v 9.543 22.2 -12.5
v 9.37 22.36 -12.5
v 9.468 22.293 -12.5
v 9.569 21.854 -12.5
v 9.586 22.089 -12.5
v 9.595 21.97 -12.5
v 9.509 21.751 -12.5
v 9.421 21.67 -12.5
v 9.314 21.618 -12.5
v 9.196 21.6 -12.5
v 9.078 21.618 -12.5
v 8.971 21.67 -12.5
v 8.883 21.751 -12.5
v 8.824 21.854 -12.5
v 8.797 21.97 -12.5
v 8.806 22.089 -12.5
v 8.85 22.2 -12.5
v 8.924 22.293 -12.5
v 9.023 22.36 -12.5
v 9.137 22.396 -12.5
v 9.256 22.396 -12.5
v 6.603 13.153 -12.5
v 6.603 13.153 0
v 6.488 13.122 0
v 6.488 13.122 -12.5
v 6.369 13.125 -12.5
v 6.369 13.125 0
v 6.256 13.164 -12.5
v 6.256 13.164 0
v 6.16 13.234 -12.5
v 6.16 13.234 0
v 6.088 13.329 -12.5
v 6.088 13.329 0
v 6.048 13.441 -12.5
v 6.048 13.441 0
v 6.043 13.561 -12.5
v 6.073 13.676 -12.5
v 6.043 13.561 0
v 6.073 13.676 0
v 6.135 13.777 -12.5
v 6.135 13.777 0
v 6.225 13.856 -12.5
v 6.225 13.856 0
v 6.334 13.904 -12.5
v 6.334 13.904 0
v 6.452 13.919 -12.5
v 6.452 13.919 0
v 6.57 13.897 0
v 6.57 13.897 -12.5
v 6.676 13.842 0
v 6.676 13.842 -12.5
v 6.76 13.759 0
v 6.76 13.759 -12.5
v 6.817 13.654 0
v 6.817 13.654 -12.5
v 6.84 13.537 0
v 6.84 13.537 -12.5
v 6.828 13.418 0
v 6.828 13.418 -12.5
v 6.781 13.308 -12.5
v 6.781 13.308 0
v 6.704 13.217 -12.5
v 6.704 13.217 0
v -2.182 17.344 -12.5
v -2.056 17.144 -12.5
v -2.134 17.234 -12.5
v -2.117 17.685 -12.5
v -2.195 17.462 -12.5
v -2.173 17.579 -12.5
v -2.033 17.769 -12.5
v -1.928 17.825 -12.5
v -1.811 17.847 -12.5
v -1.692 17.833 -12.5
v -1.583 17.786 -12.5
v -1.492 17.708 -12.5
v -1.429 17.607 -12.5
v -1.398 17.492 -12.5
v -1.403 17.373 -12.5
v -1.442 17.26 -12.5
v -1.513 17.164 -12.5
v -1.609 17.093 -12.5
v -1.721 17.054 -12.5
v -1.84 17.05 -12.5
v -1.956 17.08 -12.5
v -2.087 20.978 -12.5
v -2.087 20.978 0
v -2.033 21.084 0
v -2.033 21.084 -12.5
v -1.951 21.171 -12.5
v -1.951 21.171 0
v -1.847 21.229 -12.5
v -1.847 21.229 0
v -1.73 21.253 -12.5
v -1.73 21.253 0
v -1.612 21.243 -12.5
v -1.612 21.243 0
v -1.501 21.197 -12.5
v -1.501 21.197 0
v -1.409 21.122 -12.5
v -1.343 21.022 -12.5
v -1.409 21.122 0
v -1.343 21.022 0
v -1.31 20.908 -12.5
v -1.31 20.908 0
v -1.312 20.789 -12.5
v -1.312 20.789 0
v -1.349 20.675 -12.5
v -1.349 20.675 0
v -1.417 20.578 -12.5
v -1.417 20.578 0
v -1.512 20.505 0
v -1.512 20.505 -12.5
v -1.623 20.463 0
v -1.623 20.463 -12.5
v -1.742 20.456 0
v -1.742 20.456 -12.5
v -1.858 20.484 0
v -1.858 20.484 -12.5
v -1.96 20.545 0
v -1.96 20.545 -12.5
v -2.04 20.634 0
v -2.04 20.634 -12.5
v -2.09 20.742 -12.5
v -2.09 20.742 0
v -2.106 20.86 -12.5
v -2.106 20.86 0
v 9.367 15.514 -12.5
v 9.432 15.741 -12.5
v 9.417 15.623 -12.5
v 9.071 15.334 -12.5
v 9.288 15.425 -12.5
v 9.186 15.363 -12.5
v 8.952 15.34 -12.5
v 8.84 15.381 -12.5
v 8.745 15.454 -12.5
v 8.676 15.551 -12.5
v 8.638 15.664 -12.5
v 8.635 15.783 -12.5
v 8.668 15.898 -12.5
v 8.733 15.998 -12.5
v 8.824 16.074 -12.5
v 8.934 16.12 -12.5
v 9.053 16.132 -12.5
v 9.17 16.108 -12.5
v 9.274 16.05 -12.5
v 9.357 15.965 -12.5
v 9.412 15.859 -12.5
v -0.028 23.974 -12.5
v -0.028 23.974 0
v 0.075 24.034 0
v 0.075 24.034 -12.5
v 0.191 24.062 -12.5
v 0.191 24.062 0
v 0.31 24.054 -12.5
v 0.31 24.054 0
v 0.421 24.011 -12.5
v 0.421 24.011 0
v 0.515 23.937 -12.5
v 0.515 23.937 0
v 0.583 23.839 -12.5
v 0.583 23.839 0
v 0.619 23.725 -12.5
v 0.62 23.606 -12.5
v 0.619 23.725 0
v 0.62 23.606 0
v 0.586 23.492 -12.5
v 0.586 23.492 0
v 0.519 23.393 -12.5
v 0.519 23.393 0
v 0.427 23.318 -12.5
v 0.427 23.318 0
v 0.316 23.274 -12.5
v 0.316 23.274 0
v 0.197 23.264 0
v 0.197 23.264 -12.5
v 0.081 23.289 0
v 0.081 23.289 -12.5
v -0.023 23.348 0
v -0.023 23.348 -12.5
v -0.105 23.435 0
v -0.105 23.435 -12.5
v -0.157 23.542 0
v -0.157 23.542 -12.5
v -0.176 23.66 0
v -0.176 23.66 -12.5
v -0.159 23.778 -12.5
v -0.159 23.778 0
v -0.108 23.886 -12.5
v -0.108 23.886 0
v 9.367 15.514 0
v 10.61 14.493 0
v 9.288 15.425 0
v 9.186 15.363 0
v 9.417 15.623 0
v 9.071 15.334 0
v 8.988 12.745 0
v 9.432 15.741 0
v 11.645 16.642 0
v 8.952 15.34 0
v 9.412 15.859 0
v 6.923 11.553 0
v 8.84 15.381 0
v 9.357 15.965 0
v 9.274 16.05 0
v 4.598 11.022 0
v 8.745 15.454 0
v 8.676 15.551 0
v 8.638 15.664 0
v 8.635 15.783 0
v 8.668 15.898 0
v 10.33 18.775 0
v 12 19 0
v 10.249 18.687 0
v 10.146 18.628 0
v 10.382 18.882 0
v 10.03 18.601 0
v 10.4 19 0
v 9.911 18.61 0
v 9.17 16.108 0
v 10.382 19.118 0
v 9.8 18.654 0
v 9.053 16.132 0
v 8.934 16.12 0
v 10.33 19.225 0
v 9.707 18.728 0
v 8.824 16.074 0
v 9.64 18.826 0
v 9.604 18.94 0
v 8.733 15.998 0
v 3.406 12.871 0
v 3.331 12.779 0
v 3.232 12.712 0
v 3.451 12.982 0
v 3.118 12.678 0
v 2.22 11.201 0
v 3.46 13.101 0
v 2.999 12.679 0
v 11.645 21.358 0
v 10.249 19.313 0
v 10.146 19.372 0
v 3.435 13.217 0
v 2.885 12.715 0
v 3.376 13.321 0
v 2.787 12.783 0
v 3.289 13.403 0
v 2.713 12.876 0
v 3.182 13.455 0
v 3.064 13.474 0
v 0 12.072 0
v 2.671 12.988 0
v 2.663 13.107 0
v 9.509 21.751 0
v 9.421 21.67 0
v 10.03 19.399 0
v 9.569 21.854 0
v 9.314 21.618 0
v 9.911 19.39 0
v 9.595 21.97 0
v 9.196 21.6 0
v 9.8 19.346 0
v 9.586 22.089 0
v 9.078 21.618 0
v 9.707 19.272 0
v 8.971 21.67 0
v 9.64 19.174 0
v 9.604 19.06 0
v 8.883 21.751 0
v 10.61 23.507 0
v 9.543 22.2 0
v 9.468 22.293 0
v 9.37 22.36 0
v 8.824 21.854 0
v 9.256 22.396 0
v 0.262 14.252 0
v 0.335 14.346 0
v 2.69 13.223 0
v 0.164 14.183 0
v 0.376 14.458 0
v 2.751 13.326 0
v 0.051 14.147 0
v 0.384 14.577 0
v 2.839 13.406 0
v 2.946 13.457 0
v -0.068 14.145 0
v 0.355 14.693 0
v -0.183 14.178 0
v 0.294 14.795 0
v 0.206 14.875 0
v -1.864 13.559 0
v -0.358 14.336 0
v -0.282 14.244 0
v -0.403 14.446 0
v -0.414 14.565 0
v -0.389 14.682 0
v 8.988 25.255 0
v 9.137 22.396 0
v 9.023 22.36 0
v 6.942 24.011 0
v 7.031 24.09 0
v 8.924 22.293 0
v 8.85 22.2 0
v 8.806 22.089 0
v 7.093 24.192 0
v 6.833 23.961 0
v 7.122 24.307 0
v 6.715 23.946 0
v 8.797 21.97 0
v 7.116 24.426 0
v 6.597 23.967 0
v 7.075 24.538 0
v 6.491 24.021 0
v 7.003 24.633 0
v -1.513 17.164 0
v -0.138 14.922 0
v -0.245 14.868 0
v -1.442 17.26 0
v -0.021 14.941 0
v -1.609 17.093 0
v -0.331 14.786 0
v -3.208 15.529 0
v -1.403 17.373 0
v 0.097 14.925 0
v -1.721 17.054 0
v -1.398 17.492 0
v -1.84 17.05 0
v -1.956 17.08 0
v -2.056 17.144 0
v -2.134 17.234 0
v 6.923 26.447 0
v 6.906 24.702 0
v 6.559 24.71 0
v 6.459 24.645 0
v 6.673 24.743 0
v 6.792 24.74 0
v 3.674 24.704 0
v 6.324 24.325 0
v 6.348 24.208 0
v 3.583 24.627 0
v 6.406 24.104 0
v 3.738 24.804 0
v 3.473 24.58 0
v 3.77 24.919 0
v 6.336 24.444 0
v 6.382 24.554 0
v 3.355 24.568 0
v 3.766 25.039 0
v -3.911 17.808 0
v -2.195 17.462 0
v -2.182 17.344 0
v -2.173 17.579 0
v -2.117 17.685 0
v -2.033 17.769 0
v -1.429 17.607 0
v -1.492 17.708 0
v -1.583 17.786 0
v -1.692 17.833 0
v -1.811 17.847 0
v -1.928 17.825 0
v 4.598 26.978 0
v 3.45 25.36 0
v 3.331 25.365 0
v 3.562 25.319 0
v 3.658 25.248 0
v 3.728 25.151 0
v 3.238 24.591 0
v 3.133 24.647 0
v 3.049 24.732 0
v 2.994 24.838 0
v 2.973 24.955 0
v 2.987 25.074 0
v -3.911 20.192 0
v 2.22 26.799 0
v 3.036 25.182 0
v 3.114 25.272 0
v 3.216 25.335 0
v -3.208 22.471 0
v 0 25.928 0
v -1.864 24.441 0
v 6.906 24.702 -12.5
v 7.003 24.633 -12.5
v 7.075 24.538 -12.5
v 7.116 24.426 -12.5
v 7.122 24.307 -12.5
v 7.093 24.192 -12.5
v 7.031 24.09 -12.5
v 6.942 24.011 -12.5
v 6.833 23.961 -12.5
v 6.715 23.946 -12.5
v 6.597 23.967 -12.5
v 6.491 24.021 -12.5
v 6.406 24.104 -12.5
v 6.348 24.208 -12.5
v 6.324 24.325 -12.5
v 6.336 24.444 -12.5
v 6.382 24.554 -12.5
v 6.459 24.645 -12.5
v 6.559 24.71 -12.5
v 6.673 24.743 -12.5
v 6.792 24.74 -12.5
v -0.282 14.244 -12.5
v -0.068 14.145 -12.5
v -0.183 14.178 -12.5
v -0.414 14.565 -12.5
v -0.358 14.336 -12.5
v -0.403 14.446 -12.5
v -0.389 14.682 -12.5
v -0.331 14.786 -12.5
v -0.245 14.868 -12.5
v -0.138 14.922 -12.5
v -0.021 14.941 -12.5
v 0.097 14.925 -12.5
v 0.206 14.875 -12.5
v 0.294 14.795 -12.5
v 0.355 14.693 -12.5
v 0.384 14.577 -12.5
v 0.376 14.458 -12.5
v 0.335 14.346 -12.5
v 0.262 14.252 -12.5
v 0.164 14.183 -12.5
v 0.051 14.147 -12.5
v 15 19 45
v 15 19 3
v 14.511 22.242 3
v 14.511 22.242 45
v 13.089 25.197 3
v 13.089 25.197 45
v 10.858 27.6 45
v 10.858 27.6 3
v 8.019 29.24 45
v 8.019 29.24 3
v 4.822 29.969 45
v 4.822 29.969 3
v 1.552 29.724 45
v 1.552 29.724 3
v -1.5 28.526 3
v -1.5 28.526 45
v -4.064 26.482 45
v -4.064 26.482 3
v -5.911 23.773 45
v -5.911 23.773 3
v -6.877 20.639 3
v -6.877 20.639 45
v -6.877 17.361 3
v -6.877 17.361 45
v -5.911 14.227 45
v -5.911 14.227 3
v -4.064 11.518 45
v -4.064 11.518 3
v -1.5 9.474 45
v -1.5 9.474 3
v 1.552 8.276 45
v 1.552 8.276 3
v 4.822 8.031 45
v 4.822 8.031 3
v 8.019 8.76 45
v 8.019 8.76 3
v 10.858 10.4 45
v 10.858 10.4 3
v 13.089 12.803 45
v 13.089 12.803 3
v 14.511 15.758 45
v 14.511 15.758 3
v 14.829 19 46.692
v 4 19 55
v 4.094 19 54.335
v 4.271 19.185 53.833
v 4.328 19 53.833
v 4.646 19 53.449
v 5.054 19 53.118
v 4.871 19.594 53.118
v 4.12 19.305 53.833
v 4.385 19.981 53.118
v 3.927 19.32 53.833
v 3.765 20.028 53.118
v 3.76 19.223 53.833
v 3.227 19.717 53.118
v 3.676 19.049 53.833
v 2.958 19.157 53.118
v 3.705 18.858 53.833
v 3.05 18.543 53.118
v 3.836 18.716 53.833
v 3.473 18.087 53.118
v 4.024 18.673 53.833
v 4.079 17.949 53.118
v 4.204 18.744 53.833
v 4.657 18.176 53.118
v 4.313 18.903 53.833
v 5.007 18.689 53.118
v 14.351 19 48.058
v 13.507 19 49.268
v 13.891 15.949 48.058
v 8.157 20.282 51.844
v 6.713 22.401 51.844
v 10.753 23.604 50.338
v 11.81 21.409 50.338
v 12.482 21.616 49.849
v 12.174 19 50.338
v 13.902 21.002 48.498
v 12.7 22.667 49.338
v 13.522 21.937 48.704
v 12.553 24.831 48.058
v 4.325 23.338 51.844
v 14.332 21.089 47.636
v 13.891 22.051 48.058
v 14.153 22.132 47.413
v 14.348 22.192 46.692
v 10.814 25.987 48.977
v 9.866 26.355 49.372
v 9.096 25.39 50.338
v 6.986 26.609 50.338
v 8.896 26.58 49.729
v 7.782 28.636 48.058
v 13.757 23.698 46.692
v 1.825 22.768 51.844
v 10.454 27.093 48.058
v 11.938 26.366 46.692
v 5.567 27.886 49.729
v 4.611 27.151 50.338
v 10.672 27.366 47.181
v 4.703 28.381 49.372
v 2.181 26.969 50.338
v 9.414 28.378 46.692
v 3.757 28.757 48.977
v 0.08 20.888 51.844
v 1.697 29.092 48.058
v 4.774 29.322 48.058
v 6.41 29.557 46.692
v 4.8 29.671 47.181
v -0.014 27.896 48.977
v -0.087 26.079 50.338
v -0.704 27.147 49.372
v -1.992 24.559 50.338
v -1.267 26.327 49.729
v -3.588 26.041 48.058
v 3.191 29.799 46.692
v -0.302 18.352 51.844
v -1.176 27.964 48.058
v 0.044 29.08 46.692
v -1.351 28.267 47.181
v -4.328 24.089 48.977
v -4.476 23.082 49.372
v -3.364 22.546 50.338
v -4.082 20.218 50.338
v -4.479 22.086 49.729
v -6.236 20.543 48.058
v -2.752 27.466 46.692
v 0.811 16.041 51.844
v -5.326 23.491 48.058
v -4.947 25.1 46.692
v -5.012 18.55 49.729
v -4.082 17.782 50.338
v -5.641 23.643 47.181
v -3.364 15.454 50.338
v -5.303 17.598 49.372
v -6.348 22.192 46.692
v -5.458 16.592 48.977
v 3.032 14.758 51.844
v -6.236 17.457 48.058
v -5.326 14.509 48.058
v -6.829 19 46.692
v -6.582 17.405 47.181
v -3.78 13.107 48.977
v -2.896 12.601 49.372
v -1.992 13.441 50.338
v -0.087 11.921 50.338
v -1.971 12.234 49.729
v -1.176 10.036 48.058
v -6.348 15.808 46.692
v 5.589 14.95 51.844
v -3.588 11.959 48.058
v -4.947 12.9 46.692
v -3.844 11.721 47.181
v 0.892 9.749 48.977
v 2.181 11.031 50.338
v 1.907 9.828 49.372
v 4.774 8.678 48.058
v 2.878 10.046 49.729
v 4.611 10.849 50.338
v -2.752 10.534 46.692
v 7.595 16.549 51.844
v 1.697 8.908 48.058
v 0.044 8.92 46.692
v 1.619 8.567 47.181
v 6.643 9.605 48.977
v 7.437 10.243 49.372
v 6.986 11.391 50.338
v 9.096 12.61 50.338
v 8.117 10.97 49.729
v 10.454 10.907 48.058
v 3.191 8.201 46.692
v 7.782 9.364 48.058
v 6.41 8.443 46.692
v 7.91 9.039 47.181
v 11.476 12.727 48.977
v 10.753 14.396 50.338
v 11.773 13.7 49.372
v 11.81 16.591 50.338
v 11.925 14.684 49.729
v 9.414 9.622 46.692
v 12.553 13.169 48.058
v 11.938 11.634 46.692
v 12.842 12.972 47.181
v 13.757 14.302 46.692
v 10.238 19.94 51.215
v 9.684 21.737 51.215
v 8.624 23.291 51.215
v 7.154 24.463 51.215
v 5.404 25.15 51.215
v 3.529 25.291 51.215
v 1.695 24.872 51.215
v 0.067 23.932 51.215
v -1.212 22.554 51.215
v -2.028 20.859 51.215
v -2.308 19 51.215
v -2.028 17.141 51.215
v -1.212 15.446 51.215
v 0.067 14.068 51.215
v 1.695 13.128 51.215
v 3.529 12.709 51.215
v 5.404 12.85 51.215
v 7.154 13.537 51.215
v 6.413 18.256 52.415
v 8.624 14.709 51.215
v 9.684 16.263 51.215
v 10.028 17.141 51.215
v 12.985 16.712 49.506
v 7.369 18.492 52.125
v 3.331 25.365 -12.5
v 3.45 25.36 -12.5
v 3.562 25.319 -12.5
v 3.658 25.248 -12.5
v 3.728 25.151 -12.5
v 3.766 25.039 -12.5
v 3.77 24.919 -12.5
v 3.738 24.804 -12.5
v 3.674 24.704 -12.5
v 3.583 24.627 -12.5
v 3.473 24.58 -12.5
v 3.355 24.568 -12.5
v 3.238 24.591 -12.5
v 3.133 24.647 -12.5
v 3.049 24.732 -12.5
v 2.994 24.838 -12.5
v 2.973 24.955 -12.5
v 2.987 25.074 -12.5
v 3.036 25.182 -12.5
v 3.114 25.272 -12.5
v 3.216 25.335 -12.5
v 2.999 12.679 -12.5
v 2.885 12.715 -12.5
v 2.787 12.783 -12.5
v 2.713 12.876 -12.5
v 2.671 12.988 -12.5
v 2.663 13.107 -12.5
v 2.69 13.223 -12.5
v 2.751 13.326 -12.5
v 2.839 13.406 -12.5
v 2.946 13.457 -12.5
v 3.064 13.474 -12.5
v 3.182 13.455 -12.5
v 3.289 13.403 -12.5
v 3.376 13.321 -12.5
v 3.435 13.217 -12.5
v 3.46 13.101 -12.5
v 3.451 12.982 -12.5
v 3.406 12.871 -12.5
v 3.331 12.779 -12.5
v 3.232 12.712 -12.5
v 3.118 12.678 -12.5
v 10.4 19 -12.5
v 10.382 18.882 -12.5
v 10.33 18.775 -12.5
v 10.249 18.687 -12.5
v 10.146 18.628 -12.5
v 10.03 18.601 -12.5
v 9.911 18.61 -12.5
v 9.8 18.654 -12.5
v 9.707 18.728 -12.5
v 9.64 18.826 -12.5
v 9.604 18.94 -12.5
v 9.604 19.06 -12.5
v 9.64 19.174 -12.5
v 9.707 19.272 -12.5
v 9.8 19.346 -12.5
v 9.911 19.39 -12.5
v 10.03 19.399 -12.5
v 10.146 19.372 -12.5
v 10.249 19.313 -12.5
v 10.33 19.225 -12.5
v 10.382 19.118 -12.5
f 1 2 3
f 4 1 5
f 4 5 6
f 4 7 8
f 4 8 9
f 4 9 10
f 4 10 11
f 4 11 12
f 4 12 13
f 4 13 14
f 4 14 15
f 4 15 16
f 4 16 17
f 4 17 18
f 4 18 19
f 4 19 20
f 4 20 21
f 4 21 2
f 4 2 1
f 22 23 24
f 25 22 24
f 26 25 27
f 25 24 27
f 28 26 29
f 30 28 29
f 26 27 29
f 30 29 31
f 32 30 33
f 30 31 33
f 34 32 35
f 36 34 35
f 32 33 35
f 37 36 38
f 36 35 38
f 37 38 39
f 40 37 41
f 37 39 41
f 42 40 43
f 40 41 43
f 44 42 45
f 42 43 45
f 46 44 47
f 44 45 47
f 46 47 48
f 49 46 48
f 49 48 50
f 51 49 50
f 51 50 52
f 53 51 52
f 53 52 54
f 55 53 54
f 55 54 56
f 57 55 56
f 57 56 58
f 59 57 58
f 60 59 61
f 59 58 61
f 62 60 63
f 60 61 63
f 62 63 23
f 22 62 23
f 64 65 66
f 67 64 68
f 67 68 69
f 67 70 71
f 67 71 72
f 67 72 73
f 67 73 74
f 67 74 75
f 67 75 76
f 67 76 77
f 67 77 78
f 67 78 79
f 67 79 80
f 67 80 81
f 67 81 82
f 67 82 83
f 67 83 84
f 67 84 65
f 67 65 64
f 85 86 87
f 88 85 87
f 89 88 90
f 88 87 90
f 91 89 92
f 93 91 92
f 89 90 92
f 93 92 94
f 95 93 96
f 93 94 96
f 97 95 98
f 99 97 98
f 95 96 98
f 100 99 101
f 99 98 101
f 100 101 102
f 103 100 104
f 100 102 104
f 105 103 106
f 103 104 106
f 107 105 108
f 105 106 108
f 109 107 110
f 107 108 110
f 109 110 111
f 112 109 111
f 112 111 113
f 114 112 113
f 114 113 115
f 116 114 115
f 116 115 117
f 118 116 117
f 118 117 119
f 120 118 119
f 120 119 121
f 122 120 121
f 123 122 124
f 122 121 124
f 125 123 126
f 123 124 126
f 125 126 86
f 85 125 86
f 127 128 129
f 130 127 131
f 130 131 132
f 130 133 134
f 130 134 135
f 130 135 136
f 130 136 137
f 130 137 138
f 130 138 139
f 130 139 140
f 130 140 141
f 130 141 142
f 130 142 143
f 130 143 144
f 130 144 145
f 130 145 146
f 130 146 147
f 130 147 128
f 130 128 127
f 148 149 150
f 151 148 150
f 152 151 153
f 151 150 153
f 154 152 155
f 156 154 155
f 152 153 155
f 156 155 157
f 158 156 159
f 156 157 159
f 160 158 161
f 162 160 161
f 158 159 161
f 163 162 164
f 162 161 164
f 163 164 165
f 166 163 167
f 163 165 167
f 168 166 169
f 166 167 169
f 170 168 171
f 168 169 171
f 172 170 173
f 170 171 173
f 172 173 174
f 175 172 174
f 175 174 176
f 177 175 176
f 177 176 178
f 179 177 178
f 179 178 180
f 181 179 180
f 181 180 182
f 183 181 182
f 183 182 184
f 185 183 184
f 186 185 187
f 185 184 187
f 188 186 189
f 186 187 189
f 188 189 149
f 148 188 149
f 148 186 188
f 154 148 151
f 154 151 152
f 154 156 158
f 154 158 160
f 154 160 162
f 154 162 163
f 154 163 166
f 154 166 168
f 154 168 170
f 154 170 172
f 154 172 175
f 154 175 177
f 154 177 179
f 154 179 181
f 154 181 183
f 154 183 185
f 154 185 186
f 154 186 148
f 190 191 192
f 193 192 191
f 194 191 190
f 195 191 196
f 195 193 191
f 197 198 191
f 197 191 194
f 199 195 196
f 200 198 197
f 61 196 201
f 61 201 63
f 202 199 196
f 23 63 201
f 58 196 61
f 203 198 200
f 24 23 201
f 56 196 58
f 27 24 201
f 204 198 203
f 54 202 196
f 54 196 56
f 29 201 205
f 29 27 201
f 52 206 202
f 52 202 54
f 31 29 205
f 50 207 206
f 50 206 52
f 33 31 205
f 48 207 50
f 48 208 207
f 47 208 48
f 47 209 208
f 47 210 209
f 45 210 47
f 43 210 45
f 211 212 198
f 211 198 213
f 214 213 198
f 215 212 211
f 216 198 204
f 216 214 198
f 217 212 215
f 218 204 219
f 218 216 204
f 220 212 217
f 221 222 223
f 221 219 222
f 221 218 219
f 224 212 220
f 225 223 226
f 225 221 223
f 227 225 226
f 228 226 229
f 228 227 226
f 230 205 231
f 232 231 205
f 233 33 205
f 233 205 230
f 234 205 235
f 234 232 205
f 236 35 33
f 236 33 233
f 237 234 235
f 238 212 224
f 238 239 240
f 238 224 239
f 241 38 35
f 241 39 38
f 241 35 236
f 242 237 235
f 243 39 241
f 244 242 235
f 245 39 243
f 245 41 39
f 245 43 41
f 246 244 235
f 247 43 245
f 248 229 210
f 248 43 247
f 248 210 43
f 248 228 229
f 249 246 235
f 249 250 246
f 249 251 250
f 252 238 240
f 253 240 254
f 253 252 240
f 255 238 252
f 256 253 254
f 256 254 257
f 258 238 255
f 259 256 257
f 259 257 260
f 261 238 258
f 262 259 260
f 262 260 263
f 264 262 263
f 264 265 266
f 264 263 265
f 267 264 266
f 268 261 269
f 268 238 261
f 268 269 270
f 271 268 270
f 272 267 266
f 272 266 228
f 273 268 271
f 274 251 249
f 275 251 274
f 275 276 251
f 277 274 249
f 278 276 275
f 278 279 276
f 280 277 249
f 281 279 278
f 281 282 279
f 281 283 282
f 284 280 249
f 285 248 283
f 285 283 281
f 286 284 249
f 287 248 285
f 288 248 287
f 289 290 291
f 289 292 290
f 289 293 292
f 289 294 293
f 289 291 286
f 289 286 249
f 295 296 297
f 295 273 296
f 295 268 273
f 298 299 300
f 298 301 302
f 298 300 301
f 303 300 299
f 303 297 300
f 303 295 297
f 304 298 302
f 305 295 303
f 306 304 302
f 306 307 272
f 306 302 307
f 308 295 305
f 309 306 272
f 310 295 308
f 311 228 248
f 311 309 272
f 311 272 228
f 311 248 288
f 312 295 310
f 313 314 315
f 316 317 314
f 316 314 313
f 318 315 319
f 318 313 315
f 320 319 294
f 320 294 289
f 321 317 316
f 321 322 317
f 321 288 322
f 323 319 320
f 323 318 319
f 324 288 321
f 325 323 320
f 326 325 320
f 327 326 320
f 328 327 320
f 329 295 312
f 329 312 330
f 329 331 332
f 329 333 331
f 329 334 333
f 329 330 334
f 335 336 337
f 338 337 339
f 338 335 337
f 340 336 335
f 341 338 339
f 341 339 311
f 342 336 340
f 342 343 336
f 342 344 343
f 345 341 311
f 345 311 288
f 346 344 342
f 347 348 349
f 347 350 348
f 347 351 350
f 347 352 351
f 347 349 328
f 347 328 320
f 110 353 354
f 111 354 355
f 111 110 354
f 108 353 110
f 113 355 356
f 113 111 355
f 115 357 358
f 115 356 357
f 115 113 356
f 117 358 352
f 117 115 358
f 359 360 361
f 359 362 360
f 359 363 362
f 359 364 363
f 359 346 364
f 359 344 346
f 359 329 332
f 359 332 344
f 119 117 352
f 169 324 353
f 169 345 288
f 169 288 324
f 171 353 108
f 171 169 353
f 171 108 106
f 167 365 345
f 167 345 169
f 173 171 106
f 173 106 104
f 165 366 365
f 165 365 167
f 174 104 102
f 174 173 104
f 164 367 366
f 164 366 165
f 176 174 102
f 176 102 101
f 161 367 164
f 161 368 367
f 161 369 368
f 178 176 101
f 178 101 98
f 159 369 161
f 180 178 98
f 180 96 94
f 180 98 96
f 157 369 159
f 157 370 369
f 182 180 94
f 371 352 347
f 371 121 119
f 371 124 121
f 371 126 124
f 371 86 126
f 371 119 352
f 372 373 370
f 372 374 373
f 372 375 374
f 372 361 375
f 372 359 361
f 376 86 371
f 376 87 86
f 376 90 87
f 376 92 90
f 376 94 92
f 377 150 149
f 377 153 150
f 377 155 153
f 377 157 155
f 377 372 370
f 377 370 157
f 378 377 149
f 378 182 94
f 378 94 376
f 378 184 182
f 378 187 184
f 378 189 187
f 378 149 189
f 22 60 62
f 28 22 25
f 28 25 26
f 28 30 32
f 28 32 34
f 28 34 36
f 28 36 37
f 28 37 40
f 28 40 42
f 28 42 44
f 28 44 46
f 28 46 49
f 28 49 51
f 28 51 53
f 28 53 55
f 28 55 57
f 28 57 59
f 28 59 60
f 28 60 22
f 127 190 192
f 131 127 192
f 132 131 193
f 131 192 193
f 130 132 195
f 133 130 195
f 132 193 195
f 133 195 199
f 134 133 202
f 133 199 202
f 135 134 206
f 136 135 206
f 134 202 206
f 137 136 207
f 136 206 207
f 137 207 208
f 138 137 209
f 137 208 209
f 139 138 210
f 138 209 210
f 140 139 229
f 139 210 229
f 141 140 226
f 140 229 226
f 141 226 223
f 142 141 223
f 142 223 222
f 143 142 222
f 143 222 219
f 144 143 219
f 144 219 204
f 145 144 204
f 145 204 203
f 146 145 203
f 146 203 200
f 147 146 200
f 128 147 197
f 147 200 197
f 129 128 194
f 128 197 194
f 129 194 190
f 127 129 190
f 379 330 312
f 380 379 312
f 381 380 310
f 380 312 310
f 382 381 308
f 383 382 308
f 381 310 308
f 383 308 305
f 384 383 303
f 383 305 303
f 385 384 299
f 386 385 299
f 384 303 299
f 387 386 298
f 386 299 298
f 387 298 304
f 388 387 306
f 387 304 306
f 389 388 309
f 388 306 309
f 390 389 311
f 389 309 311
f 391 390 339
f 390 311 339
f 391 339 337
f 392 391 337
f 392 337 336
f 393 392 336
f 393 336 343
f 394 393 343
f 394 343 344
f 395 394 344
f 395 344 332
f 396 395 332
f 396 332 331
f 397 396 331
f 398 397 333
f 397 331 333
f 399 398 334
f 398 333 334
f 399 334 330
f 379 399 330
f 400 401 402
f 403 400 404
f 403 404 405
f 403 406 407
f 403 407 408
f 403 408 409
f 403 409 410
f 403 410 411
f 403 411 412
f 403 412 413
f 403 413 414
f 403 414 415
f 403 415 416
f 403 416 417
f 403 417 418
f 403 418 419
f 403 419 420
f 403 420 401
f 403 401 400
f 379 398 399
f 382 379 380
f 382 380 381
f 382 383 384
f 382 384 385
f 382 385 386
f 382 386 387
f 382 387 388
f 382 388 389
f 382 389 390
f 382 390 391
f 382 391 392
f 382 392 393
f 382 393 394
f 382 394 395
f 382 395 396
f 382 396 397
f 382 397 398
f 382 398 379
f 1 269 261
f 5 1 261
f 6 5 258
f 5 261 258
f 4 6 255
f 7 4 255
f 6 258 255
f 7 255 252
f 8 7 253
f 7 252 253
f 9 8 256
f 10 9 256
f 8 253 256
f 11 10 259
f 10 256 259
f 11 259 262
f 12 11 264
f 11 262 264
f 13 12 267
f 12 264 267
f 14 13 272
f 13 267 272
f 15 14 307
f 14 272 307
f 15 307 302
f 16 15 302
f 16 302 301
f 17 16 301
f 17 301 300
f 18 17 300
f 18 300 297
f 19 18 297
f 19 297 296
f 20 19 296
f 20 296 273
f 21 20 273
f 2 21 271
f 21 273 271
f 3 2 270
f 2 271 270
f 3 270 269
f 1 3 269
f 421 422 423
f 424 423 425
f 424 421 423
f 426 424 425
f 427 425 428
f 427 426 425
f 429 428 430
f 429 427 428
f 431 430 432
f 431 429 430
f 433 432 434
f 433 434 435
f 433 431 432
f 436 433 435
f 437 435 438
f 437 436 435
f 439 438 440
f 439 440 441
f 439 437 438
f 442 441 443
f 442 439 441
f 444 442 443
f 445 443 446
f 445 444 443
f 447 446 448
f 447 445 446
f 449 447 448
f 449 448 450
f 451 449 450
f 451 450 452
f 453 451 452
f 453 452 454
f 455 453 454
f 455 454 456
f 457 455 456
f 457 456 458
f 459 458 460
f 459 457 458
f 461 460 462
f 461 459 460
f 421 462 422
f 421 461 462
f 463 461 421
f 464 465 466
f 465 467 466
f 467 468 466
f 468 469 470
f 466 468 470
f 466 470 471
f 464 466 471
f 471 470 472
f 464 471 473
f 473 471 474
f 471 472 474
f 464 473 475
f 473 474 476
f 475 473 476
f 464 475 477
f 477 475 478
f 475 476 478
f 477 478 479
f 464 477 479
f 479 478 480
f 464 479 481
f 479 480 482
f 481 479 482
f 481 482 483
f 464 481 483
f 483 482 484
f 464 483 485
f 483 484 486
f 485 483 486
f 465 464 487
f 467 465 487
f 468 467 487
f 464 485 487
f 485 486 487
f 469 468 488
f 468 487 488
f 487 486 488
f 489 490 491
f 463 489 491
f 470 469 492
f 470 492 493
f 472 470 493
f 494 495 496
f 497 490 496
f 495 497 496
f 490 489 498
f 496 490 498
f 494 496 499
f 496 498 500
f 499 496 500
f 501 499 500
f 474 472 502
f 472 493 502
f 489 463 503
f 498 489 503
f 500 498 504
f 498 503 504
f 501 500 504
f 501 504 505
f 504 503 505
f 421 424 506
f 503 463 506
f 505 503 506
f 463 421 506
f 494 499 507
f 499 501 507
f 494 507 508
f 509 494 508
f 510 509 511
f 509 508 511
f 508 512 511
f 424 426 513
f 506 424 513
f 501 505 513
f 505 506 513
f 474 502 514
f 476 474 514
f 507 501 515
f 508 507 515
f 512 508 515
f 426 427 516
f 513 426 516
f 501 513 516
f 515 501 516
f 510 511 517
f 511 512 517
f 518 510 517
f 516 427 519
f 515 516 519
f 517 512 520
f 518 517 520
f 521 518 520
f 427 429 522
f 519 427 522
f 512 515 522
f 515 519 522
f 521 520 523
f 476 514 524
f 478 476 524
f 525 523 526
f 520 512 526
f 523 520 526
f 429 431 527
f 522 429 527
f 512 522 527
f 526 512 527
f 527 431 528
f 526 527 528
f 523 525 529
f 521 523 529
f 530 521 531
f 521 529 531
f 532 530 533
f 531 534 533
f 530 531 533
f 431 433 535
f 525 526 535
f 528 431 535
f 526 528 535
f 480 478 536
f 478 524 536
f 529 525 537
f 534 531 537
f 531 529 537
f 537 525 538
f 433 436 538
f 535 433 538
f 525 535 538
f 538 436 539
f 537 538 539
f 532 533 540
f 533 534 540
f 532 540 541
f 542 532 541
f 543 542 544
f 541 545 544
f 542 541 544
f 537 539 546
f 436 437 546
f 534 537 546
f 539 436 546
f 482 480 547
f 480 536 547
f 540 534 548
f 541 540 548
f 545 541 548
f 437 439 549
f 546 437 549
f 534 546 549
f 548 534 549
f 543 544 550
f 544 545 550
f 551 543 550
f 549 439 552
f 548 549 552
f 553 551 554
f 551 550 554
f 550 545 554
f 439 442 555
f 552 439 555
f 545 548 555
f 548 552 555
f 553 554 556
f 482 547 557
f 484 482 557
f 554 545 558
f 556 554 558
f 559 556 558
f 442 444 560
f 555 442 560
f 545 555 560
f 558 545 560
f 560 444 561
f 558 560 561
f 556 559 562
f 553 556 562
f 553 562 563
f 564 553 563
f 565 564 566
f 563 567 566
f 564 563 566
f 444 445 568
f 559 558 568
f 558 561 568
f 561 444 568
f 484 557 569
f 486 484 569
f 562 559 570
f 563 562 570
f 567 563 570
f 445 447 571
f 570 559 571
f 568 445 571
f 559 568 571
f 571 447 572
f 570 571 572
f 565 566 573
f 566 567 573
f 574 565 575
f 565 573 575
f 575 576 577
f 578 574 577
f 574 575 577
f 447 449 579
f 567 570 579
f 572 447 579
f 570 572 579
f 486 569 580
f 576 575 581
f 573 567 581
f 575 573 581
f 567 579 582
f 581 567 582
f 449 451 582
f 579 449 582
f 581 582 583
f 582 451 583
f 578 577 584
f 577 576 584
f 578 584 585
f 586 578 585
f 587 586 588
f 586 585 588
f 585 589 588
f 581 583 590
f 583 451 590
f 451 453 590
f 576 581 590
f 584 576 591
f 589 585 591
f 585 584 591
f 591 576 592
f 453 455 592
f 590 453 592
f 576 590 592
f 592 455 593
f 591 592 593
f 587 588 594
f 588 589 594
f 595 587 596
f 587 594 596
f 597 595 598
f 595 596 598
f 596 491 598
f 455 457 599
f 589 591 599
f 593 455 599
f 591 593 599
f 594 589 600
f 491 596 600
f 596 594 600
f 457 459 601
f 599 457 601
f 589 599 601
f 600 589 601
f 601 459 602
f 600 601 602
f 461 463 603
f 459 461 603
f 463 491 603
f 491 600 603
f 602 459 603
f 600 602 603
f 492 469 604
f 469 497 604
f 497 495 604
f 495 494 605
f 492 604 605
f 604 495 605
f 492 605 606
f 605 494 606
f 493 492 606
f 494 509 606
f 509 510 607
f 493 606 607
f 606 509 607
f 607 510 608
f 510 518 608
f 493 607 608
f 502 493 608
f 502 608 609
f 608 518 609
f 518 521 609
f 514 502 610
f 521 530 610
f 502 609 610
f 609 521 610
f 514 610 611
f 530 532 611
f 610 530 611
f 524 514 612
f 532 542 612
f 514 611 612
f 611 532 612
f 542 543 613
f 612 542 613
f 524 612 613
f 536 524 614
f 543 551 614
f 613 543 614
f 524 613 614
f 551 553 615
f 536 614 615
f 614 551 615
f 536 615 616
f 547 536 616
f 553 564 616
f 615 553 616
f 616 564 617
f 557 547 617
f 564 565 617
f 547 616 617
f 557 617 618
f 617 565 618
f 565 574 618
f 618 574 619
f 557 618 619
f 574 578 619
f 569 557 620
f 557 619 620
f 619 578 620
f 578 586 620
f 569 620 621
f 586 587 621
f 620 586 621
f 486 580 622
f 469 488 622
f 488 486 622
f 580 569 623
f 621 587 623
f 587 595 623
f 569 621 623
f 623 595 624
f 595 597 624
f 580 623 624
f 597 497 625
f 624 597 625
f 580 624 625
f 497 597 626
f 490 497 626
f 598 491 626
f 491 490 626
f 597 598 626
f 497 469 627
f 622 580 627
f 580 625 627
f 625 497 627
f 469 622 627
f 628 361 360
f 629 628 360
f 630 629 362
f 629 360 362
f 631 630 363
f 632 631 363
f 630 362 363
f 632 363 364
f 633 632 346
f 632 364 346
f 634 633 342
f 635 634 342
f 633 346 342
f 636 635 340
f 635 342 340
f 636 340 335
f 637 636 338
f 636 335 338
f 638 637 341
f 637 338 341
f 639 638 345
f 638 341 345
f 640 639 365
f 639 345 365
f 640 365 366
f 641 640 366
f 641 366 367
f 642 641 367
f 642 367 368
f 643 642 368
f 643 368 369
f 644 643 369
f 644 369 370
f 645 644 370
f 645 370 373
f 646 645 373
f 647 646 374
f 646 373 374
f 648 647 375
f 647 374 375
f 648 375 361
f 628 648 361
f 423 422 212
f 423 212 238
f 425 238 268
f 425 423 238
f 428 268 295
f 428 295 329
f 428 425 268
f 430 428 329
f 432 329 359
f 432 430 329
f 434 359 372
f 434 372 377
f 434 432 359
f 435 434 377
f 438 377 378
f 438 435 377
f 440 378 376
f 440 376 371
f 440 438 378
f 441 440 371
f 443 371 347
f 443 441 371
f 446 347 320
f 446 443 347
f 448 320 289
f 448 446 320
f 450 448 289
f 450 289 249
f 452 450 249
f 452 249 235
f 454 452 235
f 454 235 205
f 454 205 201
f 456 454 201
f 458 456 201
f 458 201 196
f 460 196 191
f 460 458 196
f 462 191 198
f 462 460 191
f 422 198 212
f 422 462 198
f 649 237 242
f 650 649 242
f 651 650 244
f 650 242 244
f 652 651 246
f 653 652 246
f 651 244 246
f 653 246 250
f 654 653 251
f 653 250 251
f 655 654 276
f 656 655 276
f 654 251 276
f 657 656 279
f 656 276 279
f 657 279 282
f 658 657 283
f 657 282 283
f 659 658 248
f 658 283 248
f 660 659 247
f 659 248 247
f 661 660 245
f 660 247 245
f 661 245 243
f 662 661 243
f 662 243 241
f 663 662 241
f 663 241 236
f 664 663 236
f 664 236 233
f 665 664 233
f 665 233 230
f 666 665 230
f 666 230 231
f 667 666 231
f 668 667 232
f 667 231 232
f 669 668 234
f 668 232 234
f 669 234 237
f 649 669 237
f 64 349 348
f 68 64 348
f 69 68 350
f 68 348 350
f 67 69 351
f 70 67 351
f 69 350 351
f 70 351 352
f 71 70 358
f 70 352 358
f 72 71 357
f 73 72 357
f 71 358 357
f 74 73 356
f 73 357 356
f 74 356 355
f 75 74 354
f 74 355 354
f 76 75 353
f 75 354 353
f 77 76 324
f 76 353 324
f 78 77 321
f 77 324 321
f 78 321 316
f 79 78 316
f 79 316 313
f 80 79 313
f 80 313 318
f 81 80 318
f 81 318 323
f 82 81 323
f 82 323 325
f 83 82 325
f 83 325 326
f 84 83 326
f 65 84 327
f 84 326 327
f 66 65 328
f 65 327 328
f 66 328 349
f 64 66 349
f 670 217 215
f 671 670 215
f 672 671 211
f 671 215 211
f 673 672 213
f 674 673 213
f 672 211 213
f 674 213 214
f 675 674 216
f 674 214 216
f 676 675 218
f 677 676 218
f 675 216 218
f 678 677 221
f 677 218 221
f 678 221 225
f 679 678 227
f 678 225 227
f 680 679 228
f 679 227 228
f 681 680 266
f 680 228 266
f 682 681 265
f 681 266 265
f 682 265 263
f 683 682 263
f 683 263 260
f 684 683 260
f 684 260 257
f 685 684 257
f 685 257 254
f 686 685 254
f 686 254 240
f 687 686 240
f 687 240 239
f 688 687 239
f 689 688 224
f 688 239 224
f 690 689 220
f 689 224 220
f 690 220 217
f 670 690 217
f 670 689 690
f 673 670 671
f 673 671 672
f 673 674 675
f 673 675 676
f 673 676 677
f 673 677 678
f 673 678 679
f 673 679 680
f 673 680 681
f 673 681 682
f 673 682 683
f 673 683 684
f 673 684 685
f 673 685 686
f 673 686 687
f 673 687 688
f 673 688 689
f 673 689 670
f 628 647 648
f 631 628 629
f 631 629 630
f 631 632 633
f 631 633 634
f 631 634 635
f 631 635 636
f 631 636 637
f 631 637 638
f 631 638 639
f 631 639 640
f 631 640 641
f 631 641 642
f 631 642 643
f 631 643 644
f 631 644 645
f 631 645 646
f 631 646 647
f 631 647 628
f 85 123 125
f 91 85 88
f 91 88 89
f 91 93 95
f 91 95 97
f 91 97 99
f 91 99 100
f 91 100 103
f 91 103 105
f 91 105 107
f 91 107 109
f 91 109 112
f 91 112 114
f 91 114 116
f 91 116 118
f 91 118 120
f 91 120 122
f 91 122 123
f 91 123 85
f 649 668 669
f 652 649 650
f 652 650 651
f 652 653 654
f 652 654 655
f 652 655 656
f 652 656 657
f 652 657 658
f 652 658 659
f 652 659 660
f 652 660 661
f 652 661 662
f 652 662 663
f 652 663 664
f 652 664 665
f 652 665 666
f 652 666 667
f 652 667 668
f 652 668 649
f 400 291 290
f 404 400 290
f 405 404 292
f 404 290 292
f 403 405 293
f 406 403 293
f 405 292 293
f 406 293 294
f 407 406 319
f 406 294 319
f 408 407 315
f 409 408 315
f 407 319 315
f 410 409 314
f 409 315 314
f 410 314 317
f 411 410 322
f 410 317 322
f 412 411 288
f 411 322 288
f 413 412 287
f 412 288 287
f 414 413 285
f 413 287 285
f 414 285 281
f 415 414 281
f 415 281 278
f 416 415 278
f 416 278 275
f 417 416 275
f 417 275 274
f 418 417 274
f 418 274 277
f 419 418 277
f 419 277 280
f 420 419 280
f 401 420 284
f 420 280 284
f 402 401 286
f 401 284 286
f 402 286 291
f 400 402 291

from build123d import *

# Parameters (mm, degrees)
CHAMFER001_SIZE    = 3
SKETCH013_R        = 0.4
PAD008_DEPTH       = 12.5
POLARPATTERN_COUNT = 11
POLARPATTERN_ANGLE = 330


with BuildPart() as part:
    # Sketch012 → Revolution (revolve)
    with BuildSketch(Plane.XZ):
        with BuildLine():
            Line((0, 55), (0, 0))
            Line((0, 0), (11, 0))
            Line((11, 0), (11, 45))
            add(Edge.make_bspline(
                [(0, 55), (0, 50.541328), (11, 53.4418), (11, 45)],
                knots=[0, 0, 0, 0, 1, 1, 1, 1], degree=3))
        make_face()
    revolve(axis=Axis((0, 0, 0), (0, 0, 1)))

    # Chamfer001
    chamfer001_edges = [part.edges().sort_by_distance(p)[0] for p in [
        (-11, 0, 0),
    ]]
    chamfer(chamfer001_edges, length=CHAMFER001_SIZE)

    # Sketch013 (on Face1 of Revolution) → Pad008 (new body)
    with BuildSketch(Plane(origin=(0, 0, 0), x_dir=(1, 0, 0), z_dir=(0, 0, -1))):
        with Locations((6, 0)):
            Circle(SKETCH013_R)
    pad008 = extrude(amount=PAD008_DEPTH)

    # PolarPattern: Pad008 ×11 about axis
    polarpattern_axis = Axis((0, 0, 0), (0, 0, -1))
    for i in range(1, POLARPATTERN_COUNT):
        add(pad008.rotate(polarpattern_axis, i * POLARPATTERN_ANGLE / (POLARPATTERN_COUNT - 1)))


with BuildPart() as part_1:
    # Body002 placement: moved
    add(part.part.moved(Location((4, 19, 0))))


solid = part_1.part
